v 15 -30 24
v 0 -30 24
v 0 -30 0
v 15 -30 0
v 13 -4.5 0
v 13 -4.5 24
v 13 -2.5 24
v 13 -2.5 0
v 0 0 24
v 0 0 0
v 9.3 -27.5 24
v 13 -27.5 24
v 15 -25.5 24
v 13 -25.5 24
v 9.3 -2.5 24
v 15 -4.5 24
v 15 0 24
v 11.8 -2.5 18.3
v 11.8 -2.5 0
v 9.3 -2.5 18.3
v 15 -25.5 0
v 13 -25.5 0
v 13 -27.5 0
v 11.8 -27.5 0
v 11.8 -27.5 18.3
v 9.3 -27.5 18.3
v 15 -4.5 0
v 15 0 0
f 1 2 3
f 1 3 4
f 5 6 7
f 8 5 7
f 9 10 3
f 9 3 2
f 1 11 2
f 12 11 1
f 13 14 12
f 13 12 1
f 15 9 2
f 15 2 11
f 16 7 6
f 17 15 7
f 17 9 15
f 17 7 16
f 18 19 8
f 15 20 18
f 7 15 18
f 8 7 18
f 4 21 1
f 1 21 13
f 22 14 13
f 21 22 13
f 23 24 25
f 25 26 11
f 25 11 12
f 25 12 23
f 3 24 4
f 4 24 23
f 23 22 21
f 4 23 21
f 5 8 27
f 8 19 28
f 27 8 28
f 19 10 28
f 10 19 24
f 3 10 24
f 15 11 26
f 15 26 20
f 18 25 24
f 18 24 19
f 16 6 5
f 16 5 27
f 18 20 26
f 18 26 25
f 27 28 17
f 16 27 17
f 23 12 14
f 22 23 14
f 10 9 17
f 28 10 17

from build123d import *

# Parameters (mm, degrees)
F0_W     = 15
F0_H     = 24
F1_DEPTH = 30
F2_W     = 1.2
F2_H     = 25
F3_DEPTH = 24.001
F4_W     = 2
F4_H     = 21
F5_DEPTH = 24.001
F6_W     = 2.5
F6_H     = 25
F7_DEPTH = 5.7


with BuildPart() as f1:
    # F0 (on Front) → F1 (new body)
    with BuildSketch(Plane.XZ):
        with Locations((7.5, 12)):
            Rectangle(F0_W, F0_H)
    extrude(amount=F1_DEPTH)

    # F2 (on face) → F3 (cut, through all)
    with BuildSketch(Plane.XY.offset(24)):
        with Locations((12.4, -15)):
            Rectangle(F2_W, F2_H)
    extrude(amount=-F3_DEPTH, mode=Mode.SUBTRACT)

    # F4 (on face) → F5 (cut, through all)
    with BuildSketch(Plane.XY.offset(24)):
        with Locations((14, -15)):
            Rectangle(F4_W, F4_H)
    extrude(amount=-F5_DEPTH, mode=Mode.SUBTRACT)

    # F6 (on face) → F7 (cut)
    with BuildSketch(Plane.XY.offset(24)):
        with Locations((10.55, -15)):
            Rectangle(F6_W, F6_H)
    extrude(amount=-F7_DEPTH, mode=Mode.SUBTRACT)


solid = f1.part
